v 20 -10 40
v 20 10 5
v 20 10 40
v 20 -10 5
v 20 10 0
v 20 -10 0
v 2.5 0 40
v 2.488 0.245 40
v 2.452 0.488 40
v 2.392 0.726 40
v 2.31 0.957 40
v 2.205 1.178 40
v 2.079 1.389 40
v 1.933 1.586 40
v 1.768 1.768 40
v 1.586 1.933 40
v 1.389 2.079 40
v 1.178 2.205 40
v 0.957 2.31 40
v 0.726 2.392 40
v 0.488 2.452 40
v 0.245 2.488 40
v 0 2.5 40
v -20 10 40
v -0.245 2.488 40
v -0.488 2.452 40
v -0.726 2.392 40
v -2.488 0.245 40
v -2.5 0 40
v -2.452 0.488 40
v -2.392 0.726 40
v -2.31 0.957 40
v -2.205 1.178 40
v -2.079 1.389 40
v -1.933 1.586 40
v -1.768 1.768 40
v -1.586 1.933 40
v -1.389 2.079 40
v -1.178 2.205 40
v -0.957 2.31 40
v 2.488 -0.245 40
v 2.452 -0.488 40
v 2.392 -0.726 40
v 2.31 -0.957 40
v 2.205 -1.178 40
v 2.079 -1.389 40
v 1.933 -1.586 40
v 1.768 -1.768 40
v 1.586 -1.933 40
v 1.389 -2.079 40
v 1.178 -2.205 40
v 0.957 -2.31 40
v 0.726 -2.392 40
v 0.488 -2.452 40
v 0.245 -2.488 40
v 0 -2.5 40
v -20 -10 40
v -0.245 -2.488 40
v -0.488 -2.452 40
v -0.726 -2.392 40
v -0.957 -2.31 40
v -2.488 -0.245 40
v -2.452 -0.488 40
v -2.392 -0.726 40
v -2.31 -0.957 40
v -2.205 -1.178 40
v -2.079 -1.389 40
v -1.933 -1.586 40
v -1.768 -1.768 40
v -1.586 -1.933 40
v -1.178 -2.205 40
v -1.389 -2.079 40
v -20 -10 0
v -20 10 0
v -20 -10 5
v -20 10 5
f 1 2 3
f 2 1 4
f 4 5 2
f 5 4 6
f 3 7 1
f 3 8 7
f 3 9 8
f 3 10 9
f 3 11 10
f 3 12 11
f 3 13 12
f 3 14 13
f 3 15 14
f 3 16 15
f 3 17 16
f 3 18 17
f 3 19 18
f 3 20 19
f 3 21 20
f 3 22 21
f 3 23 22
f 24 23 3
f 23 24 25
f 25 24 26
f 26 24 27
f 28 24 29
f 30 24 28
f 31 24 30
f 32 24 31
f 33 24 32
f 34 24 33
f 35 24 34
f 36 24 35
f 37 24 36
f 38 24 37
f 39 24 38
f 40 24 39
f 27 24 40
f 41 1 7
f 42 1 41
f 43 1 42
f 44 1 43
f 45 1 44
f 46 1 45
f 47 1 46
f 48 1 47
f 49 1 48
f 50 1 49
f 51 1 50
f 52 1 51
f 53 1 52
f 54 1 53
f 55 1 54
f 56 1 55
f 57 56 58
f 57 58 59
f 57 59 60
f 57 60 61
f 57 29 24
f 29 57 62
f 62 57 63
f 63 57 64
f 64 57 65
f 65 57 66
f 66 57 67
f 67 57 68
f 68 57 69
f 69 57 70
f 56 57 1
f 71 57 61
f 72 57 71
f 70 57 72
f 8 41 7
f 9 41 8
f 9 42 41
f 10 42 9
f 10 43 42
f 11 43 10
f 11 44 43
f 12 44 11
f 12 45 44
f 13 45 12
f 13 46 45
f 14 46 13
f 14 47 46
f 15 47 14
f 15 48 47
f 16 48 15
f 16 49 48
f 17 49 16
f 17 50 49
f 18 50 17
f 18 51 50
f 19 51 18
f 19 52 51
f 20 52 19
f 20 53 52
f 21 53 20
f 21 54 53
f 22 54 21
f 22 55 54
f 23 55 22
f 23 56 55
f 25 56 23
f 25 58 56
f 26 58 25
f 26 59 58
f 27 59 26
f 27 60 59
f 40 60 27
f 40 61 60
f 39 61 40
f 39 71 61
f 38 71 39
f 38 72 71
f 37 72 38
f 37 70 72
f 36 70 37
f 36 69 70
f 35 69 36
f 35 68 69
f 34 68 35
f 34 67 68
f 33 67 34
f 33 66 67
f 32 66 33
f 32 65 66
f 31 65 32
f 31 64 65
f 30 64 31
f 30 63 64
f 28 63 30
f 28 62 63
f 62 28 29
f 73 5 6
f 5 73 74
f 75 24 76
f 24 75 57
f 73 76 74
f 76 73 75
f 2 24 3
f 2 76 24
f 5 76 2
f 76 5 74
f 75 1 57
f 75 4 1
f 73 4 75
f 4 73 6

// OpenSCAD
module servo_motor() {
    difference() {
        // Main body of the servo motor
        translate([-20, -10, 0])
        cube([40, 20, 40]);

        // Shaft of the servo motor
        translate([0, 0, 40])
        cylinder(h=10, r=2.5, $fn=64);

        // Mounting flanges
        translate([-25, -15, 0])
        cube([5, 40, 5]);
        translate([20, -15, 0])
        cube([5, 40, 5]);

        // Holes in the mounting flanges
        translate([-22.5, -12.5, 2.5])
        cylinder(h=5, r=1.5, $fn=64);
        translate([22.5, -12.5, 2.5])
        cylinder(h=5, r=1.5, $fn=64);
        translate([-22.5, 12.5, 2.5])
        cylinder(h=5, r=1.5, $fn=64);
        translate([22.5, 12.5, 2.5])
        cylinder(h=5, r=1.5, $fn=64);
    }
}

servo_motor();
